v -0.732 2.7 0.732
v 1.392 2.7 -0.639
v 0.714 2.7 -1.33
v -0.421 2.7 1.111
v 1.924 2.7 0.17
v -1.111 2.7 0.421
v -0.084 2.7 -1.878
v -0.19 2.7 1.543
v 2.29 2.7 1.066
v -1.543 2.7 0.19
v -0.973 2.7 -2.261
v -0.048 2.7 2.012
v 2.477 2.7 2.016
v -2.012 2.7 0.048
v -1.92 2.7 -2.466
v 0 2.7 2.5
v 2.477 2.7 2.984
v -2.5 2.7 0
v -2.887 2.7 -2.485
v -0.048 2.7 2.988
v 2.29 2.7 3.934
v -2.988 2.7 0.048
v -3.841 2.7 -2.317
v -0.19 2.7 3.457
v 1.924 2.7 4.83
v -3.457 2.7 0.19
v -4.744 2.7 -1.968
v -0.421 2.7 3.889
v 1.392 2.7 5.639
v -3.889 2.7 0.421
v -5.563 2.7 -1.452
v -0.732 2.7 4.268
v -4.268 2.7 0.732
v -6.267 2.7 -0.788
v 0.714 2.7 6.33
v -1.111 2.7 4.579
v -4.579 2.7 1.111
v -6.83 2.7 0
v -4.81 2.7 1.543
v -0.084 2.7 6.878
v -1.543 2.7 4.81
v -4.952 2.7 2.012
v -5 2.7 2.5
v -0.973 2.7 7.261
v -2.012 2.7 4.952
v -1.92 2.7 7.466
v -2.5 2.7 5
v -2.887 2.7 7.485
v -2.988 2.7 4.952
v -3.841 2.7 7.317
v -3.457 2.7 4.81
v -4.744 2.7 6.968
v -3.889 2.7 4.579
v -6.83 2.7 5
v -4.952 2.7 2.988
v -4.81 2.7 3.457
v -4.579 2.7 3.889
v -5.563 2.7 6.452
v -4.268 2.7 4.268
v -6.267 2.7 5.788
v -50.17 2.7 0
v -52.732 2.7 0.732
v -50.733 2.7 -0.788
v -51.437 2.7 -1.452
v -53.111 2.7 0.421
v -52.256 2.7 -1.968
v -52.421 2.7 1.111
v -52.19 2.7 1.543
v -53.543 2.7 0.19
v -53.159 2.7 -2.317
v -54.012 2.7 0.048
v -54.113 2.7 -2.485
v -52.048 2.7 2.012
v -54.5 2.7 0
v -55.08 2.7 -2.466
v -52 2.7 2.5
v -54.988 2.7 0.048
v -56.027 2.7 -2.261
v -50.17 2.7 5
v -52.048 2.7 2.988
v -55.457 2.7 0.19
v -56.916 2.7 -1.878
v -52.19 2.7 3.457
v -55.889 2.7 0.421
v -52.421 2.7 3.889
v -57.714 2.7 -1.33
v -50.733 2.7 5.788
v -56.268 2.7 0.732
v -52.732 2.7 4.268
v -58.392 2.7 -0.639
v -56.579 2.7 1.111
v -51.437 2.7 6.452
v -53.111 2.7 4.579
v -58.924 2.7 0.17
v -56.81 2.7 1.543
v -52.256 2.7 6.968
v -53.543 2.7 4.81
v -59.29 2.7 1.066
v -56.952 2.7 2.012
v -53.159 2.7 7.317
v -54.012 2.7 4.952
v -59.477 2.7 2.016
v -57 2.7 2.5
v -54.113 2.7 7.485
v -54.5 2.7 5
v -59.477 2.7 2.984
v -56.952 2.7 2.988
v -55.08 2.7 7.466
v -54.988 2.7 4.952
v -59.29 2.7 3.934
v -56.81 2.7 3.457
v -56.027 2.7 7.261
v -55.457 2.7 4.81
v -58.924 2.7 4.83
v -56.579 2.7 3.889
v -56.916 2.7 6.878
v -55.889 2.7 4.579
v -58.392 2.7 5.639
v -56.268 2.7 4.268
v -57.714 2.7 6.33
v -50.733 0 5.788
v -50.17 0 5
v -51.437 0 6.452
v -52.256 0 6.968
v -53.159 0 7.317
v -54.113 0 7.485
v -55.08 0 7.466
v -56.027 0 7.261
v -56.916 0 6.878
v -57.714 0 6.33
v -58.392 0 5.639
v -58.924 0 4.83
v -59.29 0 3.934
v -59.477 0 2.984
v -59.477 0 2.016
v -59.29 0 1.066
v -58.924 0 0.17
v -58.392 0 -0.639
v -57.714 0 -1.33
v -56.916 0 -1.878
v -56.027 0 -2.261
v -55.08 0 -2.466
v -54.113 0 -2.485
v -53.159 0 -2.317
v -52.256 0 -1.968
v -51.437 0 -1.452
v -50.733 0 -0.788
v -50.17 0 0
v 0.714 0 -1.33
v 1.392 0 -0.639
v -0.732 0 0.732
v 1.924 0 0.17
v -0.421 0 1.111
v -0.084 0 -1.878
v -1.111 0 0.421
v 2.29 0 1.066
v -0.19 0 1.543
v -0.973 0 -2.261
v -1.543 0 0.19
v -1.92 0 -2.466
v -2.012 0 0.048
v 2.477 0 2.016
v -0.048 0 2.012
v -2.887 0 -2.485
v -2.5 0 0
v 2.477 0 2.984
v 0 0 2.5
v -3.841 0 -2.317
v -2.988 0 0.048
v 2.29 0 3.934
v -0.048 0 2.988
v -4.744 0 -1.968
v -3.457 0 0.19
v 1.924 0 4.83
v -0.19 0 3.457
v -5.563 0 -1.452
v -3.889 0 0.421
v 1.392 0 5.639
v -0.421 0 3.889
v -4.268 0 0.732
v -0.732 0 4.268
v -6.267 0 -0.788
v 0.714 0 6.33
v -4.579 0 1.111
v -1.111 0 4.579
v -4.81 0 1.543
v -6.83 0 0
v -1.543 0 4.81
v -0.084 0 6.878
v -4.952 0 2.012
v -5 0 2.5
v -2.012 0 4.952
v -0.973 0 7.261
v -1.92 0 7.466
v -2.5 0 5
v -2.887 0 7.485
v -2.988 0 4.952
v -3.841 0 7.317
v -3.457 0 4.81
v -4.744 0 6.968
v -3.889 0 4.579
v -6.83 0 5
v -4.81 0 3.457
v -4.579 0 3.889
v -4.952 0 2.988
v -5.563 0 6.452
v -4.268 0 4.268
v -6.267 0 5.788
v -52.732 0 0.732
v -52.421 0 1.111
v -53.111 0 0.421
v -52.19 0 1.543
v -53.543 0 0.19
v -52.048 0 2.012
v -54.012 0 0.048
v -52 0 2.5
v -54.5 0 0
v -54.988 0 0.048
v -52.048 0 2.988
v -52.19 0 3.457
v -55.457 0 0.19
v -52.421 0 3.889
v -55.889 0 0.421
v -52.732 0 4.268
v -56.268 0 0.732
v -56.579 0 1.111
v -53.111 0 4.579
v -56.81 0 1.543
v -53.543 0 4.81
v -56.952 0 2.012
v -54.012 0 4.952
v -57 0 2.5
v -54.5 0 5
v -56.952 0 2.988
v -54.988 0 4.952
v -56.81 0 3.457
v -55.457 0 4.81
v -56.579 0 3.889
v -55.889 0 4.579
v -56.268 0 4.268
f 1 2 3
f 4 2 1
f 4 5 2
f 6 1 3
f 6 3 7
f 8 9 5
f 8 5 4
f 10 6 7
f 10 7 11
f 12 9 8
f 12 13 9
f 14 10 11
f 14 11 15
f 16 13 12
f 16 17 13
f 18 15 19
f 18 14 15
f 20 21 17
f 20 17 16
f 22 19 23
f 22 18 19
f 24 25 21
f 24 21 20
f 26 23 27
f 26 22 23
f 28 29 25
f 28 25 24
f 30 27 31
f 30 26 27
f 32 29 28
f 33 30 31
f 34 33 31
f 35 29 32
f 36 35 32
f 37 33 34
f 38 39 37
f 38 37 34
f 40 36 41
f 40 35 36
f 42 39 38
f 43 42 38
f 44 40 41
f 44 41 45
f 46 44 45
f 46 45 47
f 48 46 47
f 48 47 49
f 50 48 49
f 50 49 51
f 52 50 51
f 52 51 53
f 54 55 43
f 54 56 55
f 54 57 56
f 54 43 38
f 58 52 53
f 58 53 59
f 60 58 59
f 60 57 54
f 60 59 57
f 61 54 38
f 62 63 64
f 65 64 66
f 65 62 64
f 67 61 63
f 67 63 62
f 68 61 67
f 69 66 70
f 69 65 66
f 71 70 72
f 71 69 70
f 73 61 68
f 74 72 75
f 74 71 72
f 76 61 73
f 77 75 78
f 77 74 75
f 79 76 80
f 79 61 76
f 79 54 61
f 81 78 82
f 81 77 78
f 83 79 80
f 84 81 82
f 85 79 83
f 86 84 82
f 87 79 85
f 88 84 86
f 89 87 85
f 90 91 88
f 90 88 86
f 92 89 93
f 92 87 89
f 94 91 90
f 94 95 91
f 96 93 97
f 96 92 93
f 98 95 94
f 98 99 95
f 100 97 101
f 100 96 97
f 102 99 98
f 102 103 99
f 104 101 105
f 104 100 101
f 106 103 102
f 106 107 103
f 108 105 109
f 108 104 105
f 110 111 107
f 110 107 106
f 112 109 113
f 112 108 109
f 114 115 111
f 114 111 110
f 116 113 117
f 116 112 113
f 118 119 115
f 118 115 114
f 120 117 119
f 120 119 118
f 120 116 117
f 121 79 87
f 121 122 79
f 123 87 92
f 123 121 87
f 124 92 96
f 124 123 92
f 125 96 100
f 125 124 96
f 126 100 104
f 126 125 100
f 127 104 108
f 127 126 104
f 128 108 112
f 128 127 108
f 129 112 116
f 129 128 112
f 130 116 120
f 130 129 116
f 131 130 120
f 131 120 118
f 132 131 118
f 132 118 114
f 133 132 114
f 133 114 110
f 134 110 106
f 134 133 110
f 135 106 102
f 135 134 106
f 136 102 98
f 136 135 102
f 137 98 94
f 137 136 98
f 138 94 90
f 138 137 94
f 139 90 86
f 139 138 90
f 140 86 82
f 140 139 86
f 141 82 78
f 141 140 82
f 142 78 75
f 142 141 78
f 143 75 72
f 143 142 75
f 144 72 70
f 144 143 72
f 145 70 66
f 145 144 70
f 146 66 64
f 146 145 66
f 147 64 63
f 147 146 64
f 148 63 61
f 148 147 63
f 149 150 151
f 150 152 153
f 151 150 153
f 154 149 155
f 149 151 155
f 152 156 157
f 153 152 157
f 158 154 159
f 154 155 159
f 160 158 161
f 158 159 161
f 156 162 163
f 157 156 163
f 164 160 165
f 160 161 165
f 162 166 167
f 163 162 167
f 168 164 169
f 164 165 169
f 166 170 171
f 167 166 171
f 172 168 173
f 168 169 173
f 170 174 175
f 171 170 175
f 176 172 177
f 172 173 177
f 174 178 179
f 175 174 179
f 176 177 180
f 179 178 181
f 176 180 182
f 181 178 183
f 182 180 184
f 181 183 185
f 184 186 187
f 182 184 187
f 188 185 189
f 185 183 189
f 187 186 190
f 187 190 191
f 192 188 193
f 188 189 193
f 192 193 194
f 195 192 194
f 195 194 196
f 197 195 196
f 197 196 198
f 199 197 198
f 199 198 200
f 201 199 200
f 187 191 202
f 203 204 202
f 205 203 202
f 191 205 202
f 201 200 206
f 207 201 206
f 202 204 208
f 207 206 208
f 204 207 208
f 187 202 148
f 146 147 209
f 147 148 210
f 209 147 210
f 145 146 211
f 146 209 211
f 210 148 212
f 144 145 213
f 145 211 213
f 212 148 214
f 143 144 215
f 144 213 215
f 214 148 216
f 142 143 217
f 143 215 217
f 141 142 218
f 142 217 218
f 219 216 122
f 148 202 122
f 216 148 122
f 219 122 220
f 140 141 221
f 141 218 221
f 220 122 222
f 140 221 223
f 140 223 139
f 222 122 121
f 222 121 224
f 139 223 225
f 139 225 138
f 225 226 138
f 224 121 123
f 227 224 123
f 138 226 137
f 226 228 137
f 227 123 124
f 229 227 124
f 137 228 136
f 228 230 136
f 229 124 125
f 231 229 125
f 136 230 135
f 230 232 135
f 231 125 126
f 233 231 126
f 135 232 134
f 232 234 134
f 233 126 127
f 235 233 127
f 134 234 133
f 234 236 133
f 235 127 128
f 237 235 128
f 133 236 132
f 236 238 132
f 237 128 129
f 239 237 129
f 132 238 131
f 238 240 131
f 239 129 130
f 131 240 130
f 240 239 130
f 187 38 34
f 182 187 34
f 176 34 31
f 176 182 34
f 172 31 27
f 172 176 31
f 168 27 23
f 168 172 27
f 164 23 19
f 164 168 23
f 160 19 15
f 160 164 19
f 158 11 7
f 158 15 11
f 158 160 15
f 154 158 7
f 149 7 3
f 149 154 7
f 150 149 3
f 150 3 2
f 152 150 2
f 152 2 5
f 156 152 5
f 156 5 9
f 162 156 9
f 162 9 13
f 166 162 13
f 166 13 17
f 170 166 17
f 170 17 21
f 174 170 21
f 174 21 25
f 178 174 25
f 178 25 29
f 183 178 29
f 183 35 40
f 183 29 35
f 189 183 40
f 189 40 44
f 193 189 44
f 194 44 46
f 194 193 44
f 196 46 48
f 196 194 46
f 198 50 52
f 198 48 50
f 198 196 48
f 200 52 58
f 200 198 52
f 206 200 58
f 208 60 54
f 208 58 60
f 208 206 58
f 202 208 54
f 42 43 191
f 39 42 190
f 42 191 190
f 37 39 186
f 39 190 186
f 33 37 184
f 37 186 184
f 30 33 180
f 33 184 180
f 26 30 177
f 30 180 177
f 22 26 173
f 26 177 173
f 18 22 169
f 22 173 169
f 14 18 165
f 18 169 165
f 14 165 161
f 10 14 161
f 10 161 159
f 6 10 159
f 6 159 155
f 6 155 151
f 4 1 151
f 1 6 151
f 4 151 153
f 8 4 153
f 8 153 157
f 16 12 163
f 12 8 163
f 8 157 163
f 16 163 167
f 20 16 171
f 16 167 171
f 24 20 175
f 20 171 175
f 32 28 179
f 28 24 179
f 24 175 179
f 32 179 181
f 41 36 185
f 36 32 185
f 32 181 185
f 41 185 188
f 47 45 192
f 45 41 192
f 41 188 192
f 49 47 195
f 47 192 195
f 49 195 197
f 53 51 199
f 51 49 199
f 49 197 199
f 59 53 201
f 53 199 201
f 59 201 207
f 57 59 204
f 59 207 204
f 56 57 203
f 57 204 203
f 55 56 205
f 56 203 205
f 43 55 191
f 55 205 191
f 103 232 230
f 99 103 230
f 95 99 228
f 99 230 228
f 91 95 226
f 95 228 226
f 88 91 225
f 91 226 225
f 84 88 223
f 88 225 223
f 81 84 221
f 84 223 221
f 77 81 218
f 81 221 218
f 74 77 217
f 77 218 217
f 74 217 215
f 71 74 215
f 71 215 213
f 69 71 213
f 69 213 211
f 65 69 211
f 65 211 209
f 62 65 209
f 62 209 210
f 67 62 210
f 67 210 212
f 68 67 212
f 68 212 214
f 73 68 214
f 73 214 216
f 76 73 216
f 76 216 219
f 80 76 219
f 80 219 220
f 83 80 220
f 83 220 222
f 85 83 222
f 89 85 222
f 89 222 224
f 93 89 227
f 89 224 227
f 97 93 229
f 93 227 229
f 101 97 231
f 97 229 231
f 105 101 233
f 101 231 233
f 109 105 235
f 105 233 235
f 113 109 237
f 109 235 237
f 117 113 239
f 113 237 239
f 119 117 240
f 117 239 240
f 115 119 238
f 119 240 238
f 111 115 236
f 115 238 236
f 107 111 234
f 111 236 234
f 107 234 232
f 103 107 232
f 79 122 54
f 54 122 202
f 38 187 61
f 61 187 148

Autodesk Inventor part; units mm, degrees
ref_plane "YZ Plane" through (0, 0, 0) normal (1, 0, 0) x (0, 1, 0)
ref_plane "XZ Plane" through (0, 0, 0) normal (0, 1, 0) x (-1, 0, 0)
ref_plane "XY Plane" through (0, 0, 0) normal (0, 0, 1) x (1, 0, 0)
sketch "Sketch1" plane through (0, 0, 0) normal (0, 1, 0) x (-1, 0, 0)
  line L0 (0, 0) -> (57, 0)
  line L1 (57, 0) -> (57, 5)
  line L2 (57, 5) -> (0, 5)
  line L3 (0, 5) -> (0, 0)
  circle A0 centre (54.5, 2.5) radius 2.5
  circle A1 centre (2.5, 2.5) radius 2.5
  circle A2 centre (54.5, 2.5) radius 5
  circle A3 centre (2.5, 2.5) radius 5
  line L4 (57, 0) -> (57, 5)
  line L5 (57, 2.5) -> (0, 2.5)
  point P0 (50.1699, 0)
  point P1 (50.1699, 5)
  point P2 (6.8301, 5)
  point P3 (6.8301, 0)
  dimension "d0" = 5
  dimension "d1" = 57
  dimension "d2" = 5
  dimension "d3" = 5
  dimension "d4" = 10
  dimension "d5" = 10
extrude "Extrusion1" add sketch "Sketch1" along normal blind 2.7 contours L3 A1 L0 | L0 A3 L2 L3 | A1 L5 A3 L0 | L3 L2 A1 | A3 L5 A2 L0 | A1 L2 A3 L5 | A2 L5 A0 L0 | L0 L1 L2 A2 | L2 A2 L5 A3 | A0 L1 L0 | A2 L2 A0 L5 | A0 L2 L1
properties part number "FP V2 Batang Penggerak" material "Aluminum 6061"
